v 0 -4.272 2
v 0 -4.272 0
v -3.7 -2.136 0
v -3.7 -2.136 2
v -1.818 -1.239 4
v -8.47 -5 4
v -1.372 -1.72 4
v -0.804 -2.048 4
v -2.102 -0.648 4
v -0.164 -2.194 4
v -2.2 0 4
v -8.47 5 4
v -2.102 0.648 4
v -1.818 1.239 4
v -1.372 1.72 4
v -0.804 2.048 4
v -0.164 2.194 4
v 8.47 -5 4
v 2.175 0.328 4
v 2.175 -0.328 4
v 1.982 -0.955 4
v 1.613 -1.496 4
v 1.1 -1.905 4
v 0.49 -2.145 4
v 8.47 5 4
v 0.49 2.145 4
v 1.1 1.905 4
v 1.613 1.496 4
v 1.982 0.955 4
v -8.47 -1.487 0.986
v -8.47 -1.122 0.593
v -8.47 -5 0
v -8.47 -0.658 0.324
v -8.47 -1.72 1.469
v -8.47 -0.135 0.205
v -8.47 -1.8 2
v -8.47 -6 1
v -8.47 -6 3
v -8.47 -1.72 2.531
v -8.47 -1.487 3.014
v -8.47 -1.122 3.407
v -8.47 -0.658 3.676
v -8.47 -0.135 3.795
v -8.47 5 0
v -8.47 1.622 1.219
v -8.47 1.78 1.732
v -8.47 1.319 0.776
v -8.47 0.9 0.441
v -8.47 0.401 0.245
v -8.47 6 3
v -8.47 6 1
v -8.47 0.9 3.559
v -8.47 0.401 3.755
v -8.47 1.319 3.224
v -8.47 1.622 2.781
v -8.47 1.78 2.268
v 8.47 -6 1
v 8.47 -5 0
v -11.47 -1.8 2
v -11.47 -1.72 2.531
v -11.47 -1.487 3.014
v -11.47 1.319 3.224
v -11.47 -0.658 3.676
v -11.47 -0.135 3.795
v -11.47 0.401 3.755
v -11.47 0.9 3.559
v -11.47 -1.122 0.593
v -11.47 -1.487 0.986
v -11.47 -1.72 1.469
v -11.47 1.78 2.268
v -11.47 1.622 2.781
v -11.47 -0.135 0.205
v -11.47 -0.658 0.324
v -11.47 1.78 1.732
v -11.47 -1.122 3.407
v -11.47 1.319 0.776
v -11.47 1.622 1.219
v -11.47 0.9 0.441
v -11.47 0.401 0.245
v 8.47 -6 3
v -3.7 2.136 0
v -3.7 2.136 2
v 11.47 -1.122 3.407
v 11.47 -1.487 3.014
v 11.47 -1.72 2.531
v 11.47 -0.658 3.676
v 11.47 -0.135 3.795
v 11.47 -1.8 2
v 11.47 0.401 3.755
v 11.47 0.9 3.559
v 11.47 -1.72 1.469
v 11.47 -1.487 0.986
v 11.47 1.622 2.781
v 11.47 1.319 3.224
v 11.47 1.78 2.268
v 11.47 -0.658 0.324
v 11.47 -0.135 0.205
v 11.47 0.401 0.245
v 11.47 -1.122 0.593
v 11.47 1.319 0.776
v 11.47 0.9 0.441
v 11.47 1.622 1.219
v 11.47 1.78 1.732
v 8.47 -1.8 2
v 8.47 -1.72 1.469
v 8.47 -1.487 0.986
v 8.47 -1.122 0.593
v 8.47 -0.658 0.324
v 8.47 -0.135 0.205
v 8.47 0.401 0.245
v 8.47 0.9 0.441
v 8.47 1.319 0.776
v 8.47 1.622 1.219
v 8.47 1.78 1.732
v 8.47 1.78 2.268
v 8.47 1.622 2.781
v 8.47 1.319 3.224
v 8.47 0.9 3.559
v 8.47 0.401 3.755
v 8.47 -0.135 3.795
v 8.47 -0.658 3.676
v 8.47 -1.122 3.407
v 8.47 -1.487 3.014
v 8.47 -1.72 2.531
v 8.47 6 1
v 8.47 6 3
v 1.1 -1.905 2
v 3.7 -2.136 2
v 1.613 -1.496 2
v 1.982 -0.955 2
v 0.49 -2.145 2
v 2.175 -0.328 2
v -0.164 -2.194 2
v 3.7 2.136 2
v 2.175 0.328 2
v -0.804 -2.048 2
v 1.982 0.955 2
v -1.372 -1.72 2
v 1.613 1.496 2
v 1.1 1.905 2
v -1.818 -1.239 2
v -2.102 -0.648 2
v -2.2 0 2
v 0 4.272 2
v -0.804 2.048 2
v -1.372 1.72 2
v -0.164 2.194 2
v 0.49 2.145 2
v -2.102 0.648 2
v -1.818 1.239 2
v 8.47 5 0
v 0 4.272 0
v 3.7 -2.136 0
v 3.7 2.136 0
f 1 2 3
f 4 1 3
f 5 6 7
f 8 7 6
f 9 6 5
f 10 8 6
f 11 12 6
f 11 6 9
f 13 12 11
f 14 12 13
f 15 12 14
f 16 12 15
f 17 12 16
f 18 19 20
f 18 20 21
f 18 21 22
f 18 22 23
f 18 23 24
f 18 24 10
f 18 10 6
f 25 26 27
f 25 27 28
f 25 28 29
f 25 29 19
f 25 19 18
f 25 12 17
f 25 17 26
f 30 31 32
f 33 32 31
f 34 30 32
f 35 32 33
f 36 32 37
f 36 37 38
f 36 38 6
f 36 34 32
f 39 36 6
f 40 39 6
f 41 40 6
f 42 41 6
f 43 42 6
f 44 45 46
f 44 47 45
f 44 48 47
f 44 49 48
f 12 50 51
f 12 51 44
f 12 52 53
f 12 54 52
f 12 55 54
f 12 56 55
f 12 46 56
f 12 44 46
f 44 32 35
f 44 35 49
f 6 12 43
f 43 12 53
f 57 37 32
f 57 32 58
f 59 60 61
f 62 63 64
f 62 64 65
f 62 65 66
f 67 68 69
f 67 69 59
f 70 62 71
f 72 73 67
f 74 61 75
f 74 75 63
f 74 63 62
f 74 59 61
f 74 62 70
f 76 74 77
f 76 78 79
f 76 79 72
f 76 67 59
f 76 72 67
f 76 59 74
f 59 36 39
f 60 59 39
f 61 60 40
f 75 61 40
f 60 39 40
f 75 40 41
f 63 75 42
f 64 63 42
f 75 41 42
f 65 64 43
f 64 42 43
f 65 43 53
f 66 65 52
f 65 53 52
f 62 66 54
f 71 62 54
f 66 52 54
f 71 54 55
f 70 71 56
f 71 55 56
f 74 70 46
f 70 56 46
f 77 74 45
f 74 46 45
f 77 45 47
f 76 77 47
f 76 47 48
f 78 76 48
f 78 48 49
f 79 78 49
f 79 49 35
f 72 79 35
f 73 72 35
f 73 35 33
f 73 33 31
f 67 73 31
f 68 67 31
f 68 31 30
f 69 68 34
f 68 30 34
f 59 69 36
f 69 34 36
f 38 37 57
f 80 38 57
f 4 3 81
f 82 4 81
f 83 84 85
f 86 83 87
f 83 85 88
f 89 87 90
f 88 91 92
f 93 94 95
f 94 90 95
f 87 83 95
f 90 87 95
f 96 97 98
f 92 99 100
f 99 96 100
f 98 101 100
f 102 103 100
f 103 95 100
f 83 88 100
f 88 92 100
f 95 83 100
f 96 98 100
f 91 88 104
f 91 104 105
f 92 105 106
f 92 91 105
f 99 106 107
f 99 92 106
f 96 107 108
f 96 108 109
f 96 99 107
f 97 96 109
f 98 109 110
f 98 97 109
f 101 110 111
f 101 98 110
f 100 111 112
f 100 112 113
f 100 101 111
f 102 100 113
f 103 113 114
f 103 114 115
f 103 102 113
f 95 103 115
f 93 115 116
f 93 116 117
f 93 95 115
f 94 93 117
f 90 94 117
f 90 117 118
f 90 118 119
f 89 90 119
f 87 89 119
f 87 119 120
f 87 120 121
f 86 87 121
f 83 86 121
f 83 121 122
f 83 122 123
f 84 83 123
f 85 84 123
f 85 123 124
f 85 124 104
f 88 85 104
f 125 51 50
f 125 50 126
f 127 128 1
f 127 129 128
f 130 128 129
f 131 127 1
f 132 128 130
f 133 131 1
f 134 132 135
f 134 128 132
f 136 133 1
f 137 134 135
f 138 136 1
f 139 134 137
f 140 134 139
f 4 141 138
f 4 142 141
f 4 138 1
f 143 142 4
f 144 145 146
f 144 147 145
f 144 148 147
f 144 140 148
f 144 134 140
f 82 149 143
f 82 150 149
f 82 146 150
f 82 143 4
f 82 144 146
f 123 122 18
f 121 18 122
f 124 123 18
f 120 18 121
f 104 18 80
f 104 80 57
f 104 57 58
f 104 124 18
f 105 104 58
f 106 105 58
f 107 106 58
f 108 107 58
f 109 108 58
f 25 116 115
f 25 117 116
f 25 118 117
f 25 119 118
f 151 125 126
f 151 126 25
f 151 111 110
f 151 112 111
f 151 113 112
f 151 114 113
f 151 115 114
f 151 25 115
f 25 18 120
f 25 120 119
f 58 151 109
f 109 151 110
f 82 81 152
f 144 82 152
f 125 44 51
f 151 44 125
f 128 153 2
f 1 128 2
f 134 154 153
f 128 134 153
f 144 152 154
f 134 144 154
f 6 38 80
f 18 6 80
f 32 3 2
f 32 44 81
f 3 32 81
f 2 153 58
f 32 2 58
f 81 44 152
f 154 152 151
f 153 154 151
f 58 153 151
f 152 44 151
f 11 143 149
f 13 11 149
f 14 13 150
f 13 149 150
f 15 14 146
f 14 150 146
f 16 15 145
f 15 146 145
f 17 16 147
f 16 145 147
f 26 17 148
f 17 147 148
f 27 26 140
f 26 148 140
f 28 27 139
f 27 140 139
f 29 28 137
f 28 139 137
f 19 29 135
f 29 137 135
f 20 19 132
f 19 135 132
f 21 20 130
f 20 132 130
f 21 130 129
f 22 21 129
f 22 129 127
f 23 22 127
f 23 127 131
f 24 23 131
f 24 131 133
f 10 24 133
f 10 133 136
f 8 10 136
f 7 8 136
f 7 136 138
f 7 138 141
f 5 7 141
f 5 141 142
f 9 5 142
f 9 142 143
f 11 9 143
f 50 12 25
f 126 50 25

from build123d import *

# Parameters (mm, degrees)
SKETCH_1_W          = 22.94
SKETCH_1_H          = 12
EXTRUDE_1_DEPTH     = 4
CUT_EXTRUDE_1_DEPTH = 3
CUT_EXTRUDE_START   = -3
CUT_EXTRUDE_2_DEPTH = 3
CUT_EXTRUDE_4_DEPTH = 2
SKETCH_6_R          = 2
CUT_EXTRUDE_5_DEPTH = 14.548464858
CHAMFER_1_SIZE      = 1
CHAMFER_2_SIZE      = 1
CUT_EXTRUDE_START_2 = 10
SKETCH_7_R          = 2
SKETCH_7_R_2        = 1.8
CUT_EXTRUDE_6_DEPTH = 10
SKETCH_8_R          = 2
SKETCH_8_R_2        = 1.8
CUT_EXTRUDE_7_DEPTH = 3
SKETCH_9_R          = 2.2
CUT_EXTRUDE_8_DEPTH = 14.548464858
CUT_EXTRUDE_9_DEPTH = 2


with BuildPart() as part:
    # Эскиз1 → Бобышка-Вытянуть1 (new body)
    with BuildSketch(Plane.XY):
        Rectangle(SKETCH_1_W, SKETCH_1_H)
    extrude(amount=EXTRUDE_1_DEPTH)

    # Эскиз3 → Вырез-Вытянуть1 (cut)
    with BuildSketch(Plane(origin=(11.47, 0, 0), x_dir=(0, 0, -1), z_dir=(1, 0, 0))):
        with BuildLine():
            ThreePointArc((-4, 0), (-2, 2), (0, 0))
            Line((0, 0), (0, 6))
            Line((0, 6), (-4, 6))
            Line((-4, 6), (-4, 0))
        make_face()
        with BuildLine():
            Line((-4, -6), (0, -6))
            Line((0, -6), (0, 0))
            ThreePointArc((0, 0), (-2, -2), (-4, 0))
            Line((-4, 0), (-4, -6))
        make_face()
    extrude(amount=-CUT_EXTRUDE_1_DEPTH, mode=Mode.SUBTRACT)

    # Эскиз4 → Вырез-Вытянуть2 (cut)
    with BuildSketch(Plane.ZY.offset(11.47).offset(CUT_EXTRUDE_START)):
        with BuildLine():
            Line((4, 6), (0, 6))
            Line((0, 6), (0, 0))
            ThreePointArc((0, 0), (2, 2), (4, 0))
            Line((4, 0), (4, 6))
        make_face()
        with BuildLine():
            ThreePointArc((4, 0), (2, -2), (0, 0))
            Line((0, 0), (0, -6))
            Line((0, -6), (4, -6))
            Line((4, -6), (4, 0))
        make_face()
    extrude(amount=CUT_EXTRUDE_2_DEPTH, mode=Mode.SUBTRACT)

    # Эскиз5 → Вырез-Вытянуть4 (cut)
    with BuildSketch(Plane(origin=(0, 0, 0), x_dir=(-1, 0, 0), z_dir=(0, 0, -1))):
        Polygon((0, -4.041451884), (3.5, -2.020725942), (3.5, 2.020725942), (0, 4.041451884), (-3.5, 2.020725942), (-3.5, -2.020725942), align=None)
    extrude(amount=-CUT_EXTRUDE_4_DEPTH, mode=Mode.SUBTRACT)

    # Эскиз6 → Вырез-Вытянуть5 (cut, through all)
    with BuildSketch(Plane(origin=(0, 0, 0), x_dir=(-1, 0, 0), z_dir=(0, 0, -1))):
        Circle(SKETCH_6_R)
    extrude(amount=-CUT_EXTRUDE_5_DEPTH, mode=Mode.SUBTRACT)

    # Фаска1
    chamfer_1_edges = [part.edges().sort_by_distance(p)[0] for p in [
        (0, 6, 0),
    ]]
    chamfer(chamfer_1_edges, length=CHAMFER_1_SIZE)

    # Фаска2
    chamfer_2_edges = [part.edges().sort_by_distance(p)[0] for p in [
        (0, 6, 4),
        (0, -6, 4),
        (0, -6, 0),
    ]]
    chamfer(chamfer_2_edges, length=CHAMFER_2_SIZE)

    # Эскиз7 → Вырез-Вытянуть6 (cut)
    with BuildSketch(Plane(origin=(8.47, 0, 0), x_dir=(0, 0, -1), z_dir=(1, 0, 0)).offset(CUT_EXTRUDE_START_2)):
        with Locations(Location((-2, 0, 0), (0, 0, 270))):
            Circle(SKETCH_7_R)
        with Locations(Location((-2, 0, 0), (0, 0, 270))):
            Circle(SKETCH_7_R_2, mode=Mode.SUBTRACT)
    extrude(amount=-CUT_EXTRUDE_6_DEPTH, mode=Mode.SUBTRACT)

    # Эскиз8 → Вырез-Вытянуть7 (cut)
    with BuildSketch(Plane.ZY.offset(11.47).offset(CUT_EXTRUDE_START)):
        with Locations((2, 0)):
            Circle(SKETCH_8_R)
        with Locations(Location((2, 0, 0), (0, 0, 270))):
            Circle(SKETCH_8_R_2, mode=Mode.SUBTRACT)
    extrude(amount=CUT_EXTRUDE_7_DEPTH, mode=Mode.SUBTRACT)

    # Эскиз9 → Вырез-Вытянуть8 (cut, through all)
    with BuildSketch(Plane(origin=(0, 0, 0), x_dir=(-1, 0, 0), z_dir=(0, 0, -1))):
        Circle(SKETCH_9_R)
    extrude(amount=-CUT_EXTRUDE_8_DEPTH, mode=Mode.SUBTRACT)

    # Эскиз10 → Вырез-Вытянуть9 (cut)
    with BuildSketch(Plane(origin=(0, 0, 0), x_dir=(-1, 0, 0), z_dir=(0, 0, -1))):
        Polygon((0, -4.272391992), (3.7, -2.136195996), (3.7, 2.136195996), (0, 4.272391992), (-3.7, 2.136195996), (-3.7, -2.136195996), align=None)
    extrude(amount=-CUT_EXTRUDE_9_DEPTH, mode=Mode.SUBTRACT)


solid = part.part
